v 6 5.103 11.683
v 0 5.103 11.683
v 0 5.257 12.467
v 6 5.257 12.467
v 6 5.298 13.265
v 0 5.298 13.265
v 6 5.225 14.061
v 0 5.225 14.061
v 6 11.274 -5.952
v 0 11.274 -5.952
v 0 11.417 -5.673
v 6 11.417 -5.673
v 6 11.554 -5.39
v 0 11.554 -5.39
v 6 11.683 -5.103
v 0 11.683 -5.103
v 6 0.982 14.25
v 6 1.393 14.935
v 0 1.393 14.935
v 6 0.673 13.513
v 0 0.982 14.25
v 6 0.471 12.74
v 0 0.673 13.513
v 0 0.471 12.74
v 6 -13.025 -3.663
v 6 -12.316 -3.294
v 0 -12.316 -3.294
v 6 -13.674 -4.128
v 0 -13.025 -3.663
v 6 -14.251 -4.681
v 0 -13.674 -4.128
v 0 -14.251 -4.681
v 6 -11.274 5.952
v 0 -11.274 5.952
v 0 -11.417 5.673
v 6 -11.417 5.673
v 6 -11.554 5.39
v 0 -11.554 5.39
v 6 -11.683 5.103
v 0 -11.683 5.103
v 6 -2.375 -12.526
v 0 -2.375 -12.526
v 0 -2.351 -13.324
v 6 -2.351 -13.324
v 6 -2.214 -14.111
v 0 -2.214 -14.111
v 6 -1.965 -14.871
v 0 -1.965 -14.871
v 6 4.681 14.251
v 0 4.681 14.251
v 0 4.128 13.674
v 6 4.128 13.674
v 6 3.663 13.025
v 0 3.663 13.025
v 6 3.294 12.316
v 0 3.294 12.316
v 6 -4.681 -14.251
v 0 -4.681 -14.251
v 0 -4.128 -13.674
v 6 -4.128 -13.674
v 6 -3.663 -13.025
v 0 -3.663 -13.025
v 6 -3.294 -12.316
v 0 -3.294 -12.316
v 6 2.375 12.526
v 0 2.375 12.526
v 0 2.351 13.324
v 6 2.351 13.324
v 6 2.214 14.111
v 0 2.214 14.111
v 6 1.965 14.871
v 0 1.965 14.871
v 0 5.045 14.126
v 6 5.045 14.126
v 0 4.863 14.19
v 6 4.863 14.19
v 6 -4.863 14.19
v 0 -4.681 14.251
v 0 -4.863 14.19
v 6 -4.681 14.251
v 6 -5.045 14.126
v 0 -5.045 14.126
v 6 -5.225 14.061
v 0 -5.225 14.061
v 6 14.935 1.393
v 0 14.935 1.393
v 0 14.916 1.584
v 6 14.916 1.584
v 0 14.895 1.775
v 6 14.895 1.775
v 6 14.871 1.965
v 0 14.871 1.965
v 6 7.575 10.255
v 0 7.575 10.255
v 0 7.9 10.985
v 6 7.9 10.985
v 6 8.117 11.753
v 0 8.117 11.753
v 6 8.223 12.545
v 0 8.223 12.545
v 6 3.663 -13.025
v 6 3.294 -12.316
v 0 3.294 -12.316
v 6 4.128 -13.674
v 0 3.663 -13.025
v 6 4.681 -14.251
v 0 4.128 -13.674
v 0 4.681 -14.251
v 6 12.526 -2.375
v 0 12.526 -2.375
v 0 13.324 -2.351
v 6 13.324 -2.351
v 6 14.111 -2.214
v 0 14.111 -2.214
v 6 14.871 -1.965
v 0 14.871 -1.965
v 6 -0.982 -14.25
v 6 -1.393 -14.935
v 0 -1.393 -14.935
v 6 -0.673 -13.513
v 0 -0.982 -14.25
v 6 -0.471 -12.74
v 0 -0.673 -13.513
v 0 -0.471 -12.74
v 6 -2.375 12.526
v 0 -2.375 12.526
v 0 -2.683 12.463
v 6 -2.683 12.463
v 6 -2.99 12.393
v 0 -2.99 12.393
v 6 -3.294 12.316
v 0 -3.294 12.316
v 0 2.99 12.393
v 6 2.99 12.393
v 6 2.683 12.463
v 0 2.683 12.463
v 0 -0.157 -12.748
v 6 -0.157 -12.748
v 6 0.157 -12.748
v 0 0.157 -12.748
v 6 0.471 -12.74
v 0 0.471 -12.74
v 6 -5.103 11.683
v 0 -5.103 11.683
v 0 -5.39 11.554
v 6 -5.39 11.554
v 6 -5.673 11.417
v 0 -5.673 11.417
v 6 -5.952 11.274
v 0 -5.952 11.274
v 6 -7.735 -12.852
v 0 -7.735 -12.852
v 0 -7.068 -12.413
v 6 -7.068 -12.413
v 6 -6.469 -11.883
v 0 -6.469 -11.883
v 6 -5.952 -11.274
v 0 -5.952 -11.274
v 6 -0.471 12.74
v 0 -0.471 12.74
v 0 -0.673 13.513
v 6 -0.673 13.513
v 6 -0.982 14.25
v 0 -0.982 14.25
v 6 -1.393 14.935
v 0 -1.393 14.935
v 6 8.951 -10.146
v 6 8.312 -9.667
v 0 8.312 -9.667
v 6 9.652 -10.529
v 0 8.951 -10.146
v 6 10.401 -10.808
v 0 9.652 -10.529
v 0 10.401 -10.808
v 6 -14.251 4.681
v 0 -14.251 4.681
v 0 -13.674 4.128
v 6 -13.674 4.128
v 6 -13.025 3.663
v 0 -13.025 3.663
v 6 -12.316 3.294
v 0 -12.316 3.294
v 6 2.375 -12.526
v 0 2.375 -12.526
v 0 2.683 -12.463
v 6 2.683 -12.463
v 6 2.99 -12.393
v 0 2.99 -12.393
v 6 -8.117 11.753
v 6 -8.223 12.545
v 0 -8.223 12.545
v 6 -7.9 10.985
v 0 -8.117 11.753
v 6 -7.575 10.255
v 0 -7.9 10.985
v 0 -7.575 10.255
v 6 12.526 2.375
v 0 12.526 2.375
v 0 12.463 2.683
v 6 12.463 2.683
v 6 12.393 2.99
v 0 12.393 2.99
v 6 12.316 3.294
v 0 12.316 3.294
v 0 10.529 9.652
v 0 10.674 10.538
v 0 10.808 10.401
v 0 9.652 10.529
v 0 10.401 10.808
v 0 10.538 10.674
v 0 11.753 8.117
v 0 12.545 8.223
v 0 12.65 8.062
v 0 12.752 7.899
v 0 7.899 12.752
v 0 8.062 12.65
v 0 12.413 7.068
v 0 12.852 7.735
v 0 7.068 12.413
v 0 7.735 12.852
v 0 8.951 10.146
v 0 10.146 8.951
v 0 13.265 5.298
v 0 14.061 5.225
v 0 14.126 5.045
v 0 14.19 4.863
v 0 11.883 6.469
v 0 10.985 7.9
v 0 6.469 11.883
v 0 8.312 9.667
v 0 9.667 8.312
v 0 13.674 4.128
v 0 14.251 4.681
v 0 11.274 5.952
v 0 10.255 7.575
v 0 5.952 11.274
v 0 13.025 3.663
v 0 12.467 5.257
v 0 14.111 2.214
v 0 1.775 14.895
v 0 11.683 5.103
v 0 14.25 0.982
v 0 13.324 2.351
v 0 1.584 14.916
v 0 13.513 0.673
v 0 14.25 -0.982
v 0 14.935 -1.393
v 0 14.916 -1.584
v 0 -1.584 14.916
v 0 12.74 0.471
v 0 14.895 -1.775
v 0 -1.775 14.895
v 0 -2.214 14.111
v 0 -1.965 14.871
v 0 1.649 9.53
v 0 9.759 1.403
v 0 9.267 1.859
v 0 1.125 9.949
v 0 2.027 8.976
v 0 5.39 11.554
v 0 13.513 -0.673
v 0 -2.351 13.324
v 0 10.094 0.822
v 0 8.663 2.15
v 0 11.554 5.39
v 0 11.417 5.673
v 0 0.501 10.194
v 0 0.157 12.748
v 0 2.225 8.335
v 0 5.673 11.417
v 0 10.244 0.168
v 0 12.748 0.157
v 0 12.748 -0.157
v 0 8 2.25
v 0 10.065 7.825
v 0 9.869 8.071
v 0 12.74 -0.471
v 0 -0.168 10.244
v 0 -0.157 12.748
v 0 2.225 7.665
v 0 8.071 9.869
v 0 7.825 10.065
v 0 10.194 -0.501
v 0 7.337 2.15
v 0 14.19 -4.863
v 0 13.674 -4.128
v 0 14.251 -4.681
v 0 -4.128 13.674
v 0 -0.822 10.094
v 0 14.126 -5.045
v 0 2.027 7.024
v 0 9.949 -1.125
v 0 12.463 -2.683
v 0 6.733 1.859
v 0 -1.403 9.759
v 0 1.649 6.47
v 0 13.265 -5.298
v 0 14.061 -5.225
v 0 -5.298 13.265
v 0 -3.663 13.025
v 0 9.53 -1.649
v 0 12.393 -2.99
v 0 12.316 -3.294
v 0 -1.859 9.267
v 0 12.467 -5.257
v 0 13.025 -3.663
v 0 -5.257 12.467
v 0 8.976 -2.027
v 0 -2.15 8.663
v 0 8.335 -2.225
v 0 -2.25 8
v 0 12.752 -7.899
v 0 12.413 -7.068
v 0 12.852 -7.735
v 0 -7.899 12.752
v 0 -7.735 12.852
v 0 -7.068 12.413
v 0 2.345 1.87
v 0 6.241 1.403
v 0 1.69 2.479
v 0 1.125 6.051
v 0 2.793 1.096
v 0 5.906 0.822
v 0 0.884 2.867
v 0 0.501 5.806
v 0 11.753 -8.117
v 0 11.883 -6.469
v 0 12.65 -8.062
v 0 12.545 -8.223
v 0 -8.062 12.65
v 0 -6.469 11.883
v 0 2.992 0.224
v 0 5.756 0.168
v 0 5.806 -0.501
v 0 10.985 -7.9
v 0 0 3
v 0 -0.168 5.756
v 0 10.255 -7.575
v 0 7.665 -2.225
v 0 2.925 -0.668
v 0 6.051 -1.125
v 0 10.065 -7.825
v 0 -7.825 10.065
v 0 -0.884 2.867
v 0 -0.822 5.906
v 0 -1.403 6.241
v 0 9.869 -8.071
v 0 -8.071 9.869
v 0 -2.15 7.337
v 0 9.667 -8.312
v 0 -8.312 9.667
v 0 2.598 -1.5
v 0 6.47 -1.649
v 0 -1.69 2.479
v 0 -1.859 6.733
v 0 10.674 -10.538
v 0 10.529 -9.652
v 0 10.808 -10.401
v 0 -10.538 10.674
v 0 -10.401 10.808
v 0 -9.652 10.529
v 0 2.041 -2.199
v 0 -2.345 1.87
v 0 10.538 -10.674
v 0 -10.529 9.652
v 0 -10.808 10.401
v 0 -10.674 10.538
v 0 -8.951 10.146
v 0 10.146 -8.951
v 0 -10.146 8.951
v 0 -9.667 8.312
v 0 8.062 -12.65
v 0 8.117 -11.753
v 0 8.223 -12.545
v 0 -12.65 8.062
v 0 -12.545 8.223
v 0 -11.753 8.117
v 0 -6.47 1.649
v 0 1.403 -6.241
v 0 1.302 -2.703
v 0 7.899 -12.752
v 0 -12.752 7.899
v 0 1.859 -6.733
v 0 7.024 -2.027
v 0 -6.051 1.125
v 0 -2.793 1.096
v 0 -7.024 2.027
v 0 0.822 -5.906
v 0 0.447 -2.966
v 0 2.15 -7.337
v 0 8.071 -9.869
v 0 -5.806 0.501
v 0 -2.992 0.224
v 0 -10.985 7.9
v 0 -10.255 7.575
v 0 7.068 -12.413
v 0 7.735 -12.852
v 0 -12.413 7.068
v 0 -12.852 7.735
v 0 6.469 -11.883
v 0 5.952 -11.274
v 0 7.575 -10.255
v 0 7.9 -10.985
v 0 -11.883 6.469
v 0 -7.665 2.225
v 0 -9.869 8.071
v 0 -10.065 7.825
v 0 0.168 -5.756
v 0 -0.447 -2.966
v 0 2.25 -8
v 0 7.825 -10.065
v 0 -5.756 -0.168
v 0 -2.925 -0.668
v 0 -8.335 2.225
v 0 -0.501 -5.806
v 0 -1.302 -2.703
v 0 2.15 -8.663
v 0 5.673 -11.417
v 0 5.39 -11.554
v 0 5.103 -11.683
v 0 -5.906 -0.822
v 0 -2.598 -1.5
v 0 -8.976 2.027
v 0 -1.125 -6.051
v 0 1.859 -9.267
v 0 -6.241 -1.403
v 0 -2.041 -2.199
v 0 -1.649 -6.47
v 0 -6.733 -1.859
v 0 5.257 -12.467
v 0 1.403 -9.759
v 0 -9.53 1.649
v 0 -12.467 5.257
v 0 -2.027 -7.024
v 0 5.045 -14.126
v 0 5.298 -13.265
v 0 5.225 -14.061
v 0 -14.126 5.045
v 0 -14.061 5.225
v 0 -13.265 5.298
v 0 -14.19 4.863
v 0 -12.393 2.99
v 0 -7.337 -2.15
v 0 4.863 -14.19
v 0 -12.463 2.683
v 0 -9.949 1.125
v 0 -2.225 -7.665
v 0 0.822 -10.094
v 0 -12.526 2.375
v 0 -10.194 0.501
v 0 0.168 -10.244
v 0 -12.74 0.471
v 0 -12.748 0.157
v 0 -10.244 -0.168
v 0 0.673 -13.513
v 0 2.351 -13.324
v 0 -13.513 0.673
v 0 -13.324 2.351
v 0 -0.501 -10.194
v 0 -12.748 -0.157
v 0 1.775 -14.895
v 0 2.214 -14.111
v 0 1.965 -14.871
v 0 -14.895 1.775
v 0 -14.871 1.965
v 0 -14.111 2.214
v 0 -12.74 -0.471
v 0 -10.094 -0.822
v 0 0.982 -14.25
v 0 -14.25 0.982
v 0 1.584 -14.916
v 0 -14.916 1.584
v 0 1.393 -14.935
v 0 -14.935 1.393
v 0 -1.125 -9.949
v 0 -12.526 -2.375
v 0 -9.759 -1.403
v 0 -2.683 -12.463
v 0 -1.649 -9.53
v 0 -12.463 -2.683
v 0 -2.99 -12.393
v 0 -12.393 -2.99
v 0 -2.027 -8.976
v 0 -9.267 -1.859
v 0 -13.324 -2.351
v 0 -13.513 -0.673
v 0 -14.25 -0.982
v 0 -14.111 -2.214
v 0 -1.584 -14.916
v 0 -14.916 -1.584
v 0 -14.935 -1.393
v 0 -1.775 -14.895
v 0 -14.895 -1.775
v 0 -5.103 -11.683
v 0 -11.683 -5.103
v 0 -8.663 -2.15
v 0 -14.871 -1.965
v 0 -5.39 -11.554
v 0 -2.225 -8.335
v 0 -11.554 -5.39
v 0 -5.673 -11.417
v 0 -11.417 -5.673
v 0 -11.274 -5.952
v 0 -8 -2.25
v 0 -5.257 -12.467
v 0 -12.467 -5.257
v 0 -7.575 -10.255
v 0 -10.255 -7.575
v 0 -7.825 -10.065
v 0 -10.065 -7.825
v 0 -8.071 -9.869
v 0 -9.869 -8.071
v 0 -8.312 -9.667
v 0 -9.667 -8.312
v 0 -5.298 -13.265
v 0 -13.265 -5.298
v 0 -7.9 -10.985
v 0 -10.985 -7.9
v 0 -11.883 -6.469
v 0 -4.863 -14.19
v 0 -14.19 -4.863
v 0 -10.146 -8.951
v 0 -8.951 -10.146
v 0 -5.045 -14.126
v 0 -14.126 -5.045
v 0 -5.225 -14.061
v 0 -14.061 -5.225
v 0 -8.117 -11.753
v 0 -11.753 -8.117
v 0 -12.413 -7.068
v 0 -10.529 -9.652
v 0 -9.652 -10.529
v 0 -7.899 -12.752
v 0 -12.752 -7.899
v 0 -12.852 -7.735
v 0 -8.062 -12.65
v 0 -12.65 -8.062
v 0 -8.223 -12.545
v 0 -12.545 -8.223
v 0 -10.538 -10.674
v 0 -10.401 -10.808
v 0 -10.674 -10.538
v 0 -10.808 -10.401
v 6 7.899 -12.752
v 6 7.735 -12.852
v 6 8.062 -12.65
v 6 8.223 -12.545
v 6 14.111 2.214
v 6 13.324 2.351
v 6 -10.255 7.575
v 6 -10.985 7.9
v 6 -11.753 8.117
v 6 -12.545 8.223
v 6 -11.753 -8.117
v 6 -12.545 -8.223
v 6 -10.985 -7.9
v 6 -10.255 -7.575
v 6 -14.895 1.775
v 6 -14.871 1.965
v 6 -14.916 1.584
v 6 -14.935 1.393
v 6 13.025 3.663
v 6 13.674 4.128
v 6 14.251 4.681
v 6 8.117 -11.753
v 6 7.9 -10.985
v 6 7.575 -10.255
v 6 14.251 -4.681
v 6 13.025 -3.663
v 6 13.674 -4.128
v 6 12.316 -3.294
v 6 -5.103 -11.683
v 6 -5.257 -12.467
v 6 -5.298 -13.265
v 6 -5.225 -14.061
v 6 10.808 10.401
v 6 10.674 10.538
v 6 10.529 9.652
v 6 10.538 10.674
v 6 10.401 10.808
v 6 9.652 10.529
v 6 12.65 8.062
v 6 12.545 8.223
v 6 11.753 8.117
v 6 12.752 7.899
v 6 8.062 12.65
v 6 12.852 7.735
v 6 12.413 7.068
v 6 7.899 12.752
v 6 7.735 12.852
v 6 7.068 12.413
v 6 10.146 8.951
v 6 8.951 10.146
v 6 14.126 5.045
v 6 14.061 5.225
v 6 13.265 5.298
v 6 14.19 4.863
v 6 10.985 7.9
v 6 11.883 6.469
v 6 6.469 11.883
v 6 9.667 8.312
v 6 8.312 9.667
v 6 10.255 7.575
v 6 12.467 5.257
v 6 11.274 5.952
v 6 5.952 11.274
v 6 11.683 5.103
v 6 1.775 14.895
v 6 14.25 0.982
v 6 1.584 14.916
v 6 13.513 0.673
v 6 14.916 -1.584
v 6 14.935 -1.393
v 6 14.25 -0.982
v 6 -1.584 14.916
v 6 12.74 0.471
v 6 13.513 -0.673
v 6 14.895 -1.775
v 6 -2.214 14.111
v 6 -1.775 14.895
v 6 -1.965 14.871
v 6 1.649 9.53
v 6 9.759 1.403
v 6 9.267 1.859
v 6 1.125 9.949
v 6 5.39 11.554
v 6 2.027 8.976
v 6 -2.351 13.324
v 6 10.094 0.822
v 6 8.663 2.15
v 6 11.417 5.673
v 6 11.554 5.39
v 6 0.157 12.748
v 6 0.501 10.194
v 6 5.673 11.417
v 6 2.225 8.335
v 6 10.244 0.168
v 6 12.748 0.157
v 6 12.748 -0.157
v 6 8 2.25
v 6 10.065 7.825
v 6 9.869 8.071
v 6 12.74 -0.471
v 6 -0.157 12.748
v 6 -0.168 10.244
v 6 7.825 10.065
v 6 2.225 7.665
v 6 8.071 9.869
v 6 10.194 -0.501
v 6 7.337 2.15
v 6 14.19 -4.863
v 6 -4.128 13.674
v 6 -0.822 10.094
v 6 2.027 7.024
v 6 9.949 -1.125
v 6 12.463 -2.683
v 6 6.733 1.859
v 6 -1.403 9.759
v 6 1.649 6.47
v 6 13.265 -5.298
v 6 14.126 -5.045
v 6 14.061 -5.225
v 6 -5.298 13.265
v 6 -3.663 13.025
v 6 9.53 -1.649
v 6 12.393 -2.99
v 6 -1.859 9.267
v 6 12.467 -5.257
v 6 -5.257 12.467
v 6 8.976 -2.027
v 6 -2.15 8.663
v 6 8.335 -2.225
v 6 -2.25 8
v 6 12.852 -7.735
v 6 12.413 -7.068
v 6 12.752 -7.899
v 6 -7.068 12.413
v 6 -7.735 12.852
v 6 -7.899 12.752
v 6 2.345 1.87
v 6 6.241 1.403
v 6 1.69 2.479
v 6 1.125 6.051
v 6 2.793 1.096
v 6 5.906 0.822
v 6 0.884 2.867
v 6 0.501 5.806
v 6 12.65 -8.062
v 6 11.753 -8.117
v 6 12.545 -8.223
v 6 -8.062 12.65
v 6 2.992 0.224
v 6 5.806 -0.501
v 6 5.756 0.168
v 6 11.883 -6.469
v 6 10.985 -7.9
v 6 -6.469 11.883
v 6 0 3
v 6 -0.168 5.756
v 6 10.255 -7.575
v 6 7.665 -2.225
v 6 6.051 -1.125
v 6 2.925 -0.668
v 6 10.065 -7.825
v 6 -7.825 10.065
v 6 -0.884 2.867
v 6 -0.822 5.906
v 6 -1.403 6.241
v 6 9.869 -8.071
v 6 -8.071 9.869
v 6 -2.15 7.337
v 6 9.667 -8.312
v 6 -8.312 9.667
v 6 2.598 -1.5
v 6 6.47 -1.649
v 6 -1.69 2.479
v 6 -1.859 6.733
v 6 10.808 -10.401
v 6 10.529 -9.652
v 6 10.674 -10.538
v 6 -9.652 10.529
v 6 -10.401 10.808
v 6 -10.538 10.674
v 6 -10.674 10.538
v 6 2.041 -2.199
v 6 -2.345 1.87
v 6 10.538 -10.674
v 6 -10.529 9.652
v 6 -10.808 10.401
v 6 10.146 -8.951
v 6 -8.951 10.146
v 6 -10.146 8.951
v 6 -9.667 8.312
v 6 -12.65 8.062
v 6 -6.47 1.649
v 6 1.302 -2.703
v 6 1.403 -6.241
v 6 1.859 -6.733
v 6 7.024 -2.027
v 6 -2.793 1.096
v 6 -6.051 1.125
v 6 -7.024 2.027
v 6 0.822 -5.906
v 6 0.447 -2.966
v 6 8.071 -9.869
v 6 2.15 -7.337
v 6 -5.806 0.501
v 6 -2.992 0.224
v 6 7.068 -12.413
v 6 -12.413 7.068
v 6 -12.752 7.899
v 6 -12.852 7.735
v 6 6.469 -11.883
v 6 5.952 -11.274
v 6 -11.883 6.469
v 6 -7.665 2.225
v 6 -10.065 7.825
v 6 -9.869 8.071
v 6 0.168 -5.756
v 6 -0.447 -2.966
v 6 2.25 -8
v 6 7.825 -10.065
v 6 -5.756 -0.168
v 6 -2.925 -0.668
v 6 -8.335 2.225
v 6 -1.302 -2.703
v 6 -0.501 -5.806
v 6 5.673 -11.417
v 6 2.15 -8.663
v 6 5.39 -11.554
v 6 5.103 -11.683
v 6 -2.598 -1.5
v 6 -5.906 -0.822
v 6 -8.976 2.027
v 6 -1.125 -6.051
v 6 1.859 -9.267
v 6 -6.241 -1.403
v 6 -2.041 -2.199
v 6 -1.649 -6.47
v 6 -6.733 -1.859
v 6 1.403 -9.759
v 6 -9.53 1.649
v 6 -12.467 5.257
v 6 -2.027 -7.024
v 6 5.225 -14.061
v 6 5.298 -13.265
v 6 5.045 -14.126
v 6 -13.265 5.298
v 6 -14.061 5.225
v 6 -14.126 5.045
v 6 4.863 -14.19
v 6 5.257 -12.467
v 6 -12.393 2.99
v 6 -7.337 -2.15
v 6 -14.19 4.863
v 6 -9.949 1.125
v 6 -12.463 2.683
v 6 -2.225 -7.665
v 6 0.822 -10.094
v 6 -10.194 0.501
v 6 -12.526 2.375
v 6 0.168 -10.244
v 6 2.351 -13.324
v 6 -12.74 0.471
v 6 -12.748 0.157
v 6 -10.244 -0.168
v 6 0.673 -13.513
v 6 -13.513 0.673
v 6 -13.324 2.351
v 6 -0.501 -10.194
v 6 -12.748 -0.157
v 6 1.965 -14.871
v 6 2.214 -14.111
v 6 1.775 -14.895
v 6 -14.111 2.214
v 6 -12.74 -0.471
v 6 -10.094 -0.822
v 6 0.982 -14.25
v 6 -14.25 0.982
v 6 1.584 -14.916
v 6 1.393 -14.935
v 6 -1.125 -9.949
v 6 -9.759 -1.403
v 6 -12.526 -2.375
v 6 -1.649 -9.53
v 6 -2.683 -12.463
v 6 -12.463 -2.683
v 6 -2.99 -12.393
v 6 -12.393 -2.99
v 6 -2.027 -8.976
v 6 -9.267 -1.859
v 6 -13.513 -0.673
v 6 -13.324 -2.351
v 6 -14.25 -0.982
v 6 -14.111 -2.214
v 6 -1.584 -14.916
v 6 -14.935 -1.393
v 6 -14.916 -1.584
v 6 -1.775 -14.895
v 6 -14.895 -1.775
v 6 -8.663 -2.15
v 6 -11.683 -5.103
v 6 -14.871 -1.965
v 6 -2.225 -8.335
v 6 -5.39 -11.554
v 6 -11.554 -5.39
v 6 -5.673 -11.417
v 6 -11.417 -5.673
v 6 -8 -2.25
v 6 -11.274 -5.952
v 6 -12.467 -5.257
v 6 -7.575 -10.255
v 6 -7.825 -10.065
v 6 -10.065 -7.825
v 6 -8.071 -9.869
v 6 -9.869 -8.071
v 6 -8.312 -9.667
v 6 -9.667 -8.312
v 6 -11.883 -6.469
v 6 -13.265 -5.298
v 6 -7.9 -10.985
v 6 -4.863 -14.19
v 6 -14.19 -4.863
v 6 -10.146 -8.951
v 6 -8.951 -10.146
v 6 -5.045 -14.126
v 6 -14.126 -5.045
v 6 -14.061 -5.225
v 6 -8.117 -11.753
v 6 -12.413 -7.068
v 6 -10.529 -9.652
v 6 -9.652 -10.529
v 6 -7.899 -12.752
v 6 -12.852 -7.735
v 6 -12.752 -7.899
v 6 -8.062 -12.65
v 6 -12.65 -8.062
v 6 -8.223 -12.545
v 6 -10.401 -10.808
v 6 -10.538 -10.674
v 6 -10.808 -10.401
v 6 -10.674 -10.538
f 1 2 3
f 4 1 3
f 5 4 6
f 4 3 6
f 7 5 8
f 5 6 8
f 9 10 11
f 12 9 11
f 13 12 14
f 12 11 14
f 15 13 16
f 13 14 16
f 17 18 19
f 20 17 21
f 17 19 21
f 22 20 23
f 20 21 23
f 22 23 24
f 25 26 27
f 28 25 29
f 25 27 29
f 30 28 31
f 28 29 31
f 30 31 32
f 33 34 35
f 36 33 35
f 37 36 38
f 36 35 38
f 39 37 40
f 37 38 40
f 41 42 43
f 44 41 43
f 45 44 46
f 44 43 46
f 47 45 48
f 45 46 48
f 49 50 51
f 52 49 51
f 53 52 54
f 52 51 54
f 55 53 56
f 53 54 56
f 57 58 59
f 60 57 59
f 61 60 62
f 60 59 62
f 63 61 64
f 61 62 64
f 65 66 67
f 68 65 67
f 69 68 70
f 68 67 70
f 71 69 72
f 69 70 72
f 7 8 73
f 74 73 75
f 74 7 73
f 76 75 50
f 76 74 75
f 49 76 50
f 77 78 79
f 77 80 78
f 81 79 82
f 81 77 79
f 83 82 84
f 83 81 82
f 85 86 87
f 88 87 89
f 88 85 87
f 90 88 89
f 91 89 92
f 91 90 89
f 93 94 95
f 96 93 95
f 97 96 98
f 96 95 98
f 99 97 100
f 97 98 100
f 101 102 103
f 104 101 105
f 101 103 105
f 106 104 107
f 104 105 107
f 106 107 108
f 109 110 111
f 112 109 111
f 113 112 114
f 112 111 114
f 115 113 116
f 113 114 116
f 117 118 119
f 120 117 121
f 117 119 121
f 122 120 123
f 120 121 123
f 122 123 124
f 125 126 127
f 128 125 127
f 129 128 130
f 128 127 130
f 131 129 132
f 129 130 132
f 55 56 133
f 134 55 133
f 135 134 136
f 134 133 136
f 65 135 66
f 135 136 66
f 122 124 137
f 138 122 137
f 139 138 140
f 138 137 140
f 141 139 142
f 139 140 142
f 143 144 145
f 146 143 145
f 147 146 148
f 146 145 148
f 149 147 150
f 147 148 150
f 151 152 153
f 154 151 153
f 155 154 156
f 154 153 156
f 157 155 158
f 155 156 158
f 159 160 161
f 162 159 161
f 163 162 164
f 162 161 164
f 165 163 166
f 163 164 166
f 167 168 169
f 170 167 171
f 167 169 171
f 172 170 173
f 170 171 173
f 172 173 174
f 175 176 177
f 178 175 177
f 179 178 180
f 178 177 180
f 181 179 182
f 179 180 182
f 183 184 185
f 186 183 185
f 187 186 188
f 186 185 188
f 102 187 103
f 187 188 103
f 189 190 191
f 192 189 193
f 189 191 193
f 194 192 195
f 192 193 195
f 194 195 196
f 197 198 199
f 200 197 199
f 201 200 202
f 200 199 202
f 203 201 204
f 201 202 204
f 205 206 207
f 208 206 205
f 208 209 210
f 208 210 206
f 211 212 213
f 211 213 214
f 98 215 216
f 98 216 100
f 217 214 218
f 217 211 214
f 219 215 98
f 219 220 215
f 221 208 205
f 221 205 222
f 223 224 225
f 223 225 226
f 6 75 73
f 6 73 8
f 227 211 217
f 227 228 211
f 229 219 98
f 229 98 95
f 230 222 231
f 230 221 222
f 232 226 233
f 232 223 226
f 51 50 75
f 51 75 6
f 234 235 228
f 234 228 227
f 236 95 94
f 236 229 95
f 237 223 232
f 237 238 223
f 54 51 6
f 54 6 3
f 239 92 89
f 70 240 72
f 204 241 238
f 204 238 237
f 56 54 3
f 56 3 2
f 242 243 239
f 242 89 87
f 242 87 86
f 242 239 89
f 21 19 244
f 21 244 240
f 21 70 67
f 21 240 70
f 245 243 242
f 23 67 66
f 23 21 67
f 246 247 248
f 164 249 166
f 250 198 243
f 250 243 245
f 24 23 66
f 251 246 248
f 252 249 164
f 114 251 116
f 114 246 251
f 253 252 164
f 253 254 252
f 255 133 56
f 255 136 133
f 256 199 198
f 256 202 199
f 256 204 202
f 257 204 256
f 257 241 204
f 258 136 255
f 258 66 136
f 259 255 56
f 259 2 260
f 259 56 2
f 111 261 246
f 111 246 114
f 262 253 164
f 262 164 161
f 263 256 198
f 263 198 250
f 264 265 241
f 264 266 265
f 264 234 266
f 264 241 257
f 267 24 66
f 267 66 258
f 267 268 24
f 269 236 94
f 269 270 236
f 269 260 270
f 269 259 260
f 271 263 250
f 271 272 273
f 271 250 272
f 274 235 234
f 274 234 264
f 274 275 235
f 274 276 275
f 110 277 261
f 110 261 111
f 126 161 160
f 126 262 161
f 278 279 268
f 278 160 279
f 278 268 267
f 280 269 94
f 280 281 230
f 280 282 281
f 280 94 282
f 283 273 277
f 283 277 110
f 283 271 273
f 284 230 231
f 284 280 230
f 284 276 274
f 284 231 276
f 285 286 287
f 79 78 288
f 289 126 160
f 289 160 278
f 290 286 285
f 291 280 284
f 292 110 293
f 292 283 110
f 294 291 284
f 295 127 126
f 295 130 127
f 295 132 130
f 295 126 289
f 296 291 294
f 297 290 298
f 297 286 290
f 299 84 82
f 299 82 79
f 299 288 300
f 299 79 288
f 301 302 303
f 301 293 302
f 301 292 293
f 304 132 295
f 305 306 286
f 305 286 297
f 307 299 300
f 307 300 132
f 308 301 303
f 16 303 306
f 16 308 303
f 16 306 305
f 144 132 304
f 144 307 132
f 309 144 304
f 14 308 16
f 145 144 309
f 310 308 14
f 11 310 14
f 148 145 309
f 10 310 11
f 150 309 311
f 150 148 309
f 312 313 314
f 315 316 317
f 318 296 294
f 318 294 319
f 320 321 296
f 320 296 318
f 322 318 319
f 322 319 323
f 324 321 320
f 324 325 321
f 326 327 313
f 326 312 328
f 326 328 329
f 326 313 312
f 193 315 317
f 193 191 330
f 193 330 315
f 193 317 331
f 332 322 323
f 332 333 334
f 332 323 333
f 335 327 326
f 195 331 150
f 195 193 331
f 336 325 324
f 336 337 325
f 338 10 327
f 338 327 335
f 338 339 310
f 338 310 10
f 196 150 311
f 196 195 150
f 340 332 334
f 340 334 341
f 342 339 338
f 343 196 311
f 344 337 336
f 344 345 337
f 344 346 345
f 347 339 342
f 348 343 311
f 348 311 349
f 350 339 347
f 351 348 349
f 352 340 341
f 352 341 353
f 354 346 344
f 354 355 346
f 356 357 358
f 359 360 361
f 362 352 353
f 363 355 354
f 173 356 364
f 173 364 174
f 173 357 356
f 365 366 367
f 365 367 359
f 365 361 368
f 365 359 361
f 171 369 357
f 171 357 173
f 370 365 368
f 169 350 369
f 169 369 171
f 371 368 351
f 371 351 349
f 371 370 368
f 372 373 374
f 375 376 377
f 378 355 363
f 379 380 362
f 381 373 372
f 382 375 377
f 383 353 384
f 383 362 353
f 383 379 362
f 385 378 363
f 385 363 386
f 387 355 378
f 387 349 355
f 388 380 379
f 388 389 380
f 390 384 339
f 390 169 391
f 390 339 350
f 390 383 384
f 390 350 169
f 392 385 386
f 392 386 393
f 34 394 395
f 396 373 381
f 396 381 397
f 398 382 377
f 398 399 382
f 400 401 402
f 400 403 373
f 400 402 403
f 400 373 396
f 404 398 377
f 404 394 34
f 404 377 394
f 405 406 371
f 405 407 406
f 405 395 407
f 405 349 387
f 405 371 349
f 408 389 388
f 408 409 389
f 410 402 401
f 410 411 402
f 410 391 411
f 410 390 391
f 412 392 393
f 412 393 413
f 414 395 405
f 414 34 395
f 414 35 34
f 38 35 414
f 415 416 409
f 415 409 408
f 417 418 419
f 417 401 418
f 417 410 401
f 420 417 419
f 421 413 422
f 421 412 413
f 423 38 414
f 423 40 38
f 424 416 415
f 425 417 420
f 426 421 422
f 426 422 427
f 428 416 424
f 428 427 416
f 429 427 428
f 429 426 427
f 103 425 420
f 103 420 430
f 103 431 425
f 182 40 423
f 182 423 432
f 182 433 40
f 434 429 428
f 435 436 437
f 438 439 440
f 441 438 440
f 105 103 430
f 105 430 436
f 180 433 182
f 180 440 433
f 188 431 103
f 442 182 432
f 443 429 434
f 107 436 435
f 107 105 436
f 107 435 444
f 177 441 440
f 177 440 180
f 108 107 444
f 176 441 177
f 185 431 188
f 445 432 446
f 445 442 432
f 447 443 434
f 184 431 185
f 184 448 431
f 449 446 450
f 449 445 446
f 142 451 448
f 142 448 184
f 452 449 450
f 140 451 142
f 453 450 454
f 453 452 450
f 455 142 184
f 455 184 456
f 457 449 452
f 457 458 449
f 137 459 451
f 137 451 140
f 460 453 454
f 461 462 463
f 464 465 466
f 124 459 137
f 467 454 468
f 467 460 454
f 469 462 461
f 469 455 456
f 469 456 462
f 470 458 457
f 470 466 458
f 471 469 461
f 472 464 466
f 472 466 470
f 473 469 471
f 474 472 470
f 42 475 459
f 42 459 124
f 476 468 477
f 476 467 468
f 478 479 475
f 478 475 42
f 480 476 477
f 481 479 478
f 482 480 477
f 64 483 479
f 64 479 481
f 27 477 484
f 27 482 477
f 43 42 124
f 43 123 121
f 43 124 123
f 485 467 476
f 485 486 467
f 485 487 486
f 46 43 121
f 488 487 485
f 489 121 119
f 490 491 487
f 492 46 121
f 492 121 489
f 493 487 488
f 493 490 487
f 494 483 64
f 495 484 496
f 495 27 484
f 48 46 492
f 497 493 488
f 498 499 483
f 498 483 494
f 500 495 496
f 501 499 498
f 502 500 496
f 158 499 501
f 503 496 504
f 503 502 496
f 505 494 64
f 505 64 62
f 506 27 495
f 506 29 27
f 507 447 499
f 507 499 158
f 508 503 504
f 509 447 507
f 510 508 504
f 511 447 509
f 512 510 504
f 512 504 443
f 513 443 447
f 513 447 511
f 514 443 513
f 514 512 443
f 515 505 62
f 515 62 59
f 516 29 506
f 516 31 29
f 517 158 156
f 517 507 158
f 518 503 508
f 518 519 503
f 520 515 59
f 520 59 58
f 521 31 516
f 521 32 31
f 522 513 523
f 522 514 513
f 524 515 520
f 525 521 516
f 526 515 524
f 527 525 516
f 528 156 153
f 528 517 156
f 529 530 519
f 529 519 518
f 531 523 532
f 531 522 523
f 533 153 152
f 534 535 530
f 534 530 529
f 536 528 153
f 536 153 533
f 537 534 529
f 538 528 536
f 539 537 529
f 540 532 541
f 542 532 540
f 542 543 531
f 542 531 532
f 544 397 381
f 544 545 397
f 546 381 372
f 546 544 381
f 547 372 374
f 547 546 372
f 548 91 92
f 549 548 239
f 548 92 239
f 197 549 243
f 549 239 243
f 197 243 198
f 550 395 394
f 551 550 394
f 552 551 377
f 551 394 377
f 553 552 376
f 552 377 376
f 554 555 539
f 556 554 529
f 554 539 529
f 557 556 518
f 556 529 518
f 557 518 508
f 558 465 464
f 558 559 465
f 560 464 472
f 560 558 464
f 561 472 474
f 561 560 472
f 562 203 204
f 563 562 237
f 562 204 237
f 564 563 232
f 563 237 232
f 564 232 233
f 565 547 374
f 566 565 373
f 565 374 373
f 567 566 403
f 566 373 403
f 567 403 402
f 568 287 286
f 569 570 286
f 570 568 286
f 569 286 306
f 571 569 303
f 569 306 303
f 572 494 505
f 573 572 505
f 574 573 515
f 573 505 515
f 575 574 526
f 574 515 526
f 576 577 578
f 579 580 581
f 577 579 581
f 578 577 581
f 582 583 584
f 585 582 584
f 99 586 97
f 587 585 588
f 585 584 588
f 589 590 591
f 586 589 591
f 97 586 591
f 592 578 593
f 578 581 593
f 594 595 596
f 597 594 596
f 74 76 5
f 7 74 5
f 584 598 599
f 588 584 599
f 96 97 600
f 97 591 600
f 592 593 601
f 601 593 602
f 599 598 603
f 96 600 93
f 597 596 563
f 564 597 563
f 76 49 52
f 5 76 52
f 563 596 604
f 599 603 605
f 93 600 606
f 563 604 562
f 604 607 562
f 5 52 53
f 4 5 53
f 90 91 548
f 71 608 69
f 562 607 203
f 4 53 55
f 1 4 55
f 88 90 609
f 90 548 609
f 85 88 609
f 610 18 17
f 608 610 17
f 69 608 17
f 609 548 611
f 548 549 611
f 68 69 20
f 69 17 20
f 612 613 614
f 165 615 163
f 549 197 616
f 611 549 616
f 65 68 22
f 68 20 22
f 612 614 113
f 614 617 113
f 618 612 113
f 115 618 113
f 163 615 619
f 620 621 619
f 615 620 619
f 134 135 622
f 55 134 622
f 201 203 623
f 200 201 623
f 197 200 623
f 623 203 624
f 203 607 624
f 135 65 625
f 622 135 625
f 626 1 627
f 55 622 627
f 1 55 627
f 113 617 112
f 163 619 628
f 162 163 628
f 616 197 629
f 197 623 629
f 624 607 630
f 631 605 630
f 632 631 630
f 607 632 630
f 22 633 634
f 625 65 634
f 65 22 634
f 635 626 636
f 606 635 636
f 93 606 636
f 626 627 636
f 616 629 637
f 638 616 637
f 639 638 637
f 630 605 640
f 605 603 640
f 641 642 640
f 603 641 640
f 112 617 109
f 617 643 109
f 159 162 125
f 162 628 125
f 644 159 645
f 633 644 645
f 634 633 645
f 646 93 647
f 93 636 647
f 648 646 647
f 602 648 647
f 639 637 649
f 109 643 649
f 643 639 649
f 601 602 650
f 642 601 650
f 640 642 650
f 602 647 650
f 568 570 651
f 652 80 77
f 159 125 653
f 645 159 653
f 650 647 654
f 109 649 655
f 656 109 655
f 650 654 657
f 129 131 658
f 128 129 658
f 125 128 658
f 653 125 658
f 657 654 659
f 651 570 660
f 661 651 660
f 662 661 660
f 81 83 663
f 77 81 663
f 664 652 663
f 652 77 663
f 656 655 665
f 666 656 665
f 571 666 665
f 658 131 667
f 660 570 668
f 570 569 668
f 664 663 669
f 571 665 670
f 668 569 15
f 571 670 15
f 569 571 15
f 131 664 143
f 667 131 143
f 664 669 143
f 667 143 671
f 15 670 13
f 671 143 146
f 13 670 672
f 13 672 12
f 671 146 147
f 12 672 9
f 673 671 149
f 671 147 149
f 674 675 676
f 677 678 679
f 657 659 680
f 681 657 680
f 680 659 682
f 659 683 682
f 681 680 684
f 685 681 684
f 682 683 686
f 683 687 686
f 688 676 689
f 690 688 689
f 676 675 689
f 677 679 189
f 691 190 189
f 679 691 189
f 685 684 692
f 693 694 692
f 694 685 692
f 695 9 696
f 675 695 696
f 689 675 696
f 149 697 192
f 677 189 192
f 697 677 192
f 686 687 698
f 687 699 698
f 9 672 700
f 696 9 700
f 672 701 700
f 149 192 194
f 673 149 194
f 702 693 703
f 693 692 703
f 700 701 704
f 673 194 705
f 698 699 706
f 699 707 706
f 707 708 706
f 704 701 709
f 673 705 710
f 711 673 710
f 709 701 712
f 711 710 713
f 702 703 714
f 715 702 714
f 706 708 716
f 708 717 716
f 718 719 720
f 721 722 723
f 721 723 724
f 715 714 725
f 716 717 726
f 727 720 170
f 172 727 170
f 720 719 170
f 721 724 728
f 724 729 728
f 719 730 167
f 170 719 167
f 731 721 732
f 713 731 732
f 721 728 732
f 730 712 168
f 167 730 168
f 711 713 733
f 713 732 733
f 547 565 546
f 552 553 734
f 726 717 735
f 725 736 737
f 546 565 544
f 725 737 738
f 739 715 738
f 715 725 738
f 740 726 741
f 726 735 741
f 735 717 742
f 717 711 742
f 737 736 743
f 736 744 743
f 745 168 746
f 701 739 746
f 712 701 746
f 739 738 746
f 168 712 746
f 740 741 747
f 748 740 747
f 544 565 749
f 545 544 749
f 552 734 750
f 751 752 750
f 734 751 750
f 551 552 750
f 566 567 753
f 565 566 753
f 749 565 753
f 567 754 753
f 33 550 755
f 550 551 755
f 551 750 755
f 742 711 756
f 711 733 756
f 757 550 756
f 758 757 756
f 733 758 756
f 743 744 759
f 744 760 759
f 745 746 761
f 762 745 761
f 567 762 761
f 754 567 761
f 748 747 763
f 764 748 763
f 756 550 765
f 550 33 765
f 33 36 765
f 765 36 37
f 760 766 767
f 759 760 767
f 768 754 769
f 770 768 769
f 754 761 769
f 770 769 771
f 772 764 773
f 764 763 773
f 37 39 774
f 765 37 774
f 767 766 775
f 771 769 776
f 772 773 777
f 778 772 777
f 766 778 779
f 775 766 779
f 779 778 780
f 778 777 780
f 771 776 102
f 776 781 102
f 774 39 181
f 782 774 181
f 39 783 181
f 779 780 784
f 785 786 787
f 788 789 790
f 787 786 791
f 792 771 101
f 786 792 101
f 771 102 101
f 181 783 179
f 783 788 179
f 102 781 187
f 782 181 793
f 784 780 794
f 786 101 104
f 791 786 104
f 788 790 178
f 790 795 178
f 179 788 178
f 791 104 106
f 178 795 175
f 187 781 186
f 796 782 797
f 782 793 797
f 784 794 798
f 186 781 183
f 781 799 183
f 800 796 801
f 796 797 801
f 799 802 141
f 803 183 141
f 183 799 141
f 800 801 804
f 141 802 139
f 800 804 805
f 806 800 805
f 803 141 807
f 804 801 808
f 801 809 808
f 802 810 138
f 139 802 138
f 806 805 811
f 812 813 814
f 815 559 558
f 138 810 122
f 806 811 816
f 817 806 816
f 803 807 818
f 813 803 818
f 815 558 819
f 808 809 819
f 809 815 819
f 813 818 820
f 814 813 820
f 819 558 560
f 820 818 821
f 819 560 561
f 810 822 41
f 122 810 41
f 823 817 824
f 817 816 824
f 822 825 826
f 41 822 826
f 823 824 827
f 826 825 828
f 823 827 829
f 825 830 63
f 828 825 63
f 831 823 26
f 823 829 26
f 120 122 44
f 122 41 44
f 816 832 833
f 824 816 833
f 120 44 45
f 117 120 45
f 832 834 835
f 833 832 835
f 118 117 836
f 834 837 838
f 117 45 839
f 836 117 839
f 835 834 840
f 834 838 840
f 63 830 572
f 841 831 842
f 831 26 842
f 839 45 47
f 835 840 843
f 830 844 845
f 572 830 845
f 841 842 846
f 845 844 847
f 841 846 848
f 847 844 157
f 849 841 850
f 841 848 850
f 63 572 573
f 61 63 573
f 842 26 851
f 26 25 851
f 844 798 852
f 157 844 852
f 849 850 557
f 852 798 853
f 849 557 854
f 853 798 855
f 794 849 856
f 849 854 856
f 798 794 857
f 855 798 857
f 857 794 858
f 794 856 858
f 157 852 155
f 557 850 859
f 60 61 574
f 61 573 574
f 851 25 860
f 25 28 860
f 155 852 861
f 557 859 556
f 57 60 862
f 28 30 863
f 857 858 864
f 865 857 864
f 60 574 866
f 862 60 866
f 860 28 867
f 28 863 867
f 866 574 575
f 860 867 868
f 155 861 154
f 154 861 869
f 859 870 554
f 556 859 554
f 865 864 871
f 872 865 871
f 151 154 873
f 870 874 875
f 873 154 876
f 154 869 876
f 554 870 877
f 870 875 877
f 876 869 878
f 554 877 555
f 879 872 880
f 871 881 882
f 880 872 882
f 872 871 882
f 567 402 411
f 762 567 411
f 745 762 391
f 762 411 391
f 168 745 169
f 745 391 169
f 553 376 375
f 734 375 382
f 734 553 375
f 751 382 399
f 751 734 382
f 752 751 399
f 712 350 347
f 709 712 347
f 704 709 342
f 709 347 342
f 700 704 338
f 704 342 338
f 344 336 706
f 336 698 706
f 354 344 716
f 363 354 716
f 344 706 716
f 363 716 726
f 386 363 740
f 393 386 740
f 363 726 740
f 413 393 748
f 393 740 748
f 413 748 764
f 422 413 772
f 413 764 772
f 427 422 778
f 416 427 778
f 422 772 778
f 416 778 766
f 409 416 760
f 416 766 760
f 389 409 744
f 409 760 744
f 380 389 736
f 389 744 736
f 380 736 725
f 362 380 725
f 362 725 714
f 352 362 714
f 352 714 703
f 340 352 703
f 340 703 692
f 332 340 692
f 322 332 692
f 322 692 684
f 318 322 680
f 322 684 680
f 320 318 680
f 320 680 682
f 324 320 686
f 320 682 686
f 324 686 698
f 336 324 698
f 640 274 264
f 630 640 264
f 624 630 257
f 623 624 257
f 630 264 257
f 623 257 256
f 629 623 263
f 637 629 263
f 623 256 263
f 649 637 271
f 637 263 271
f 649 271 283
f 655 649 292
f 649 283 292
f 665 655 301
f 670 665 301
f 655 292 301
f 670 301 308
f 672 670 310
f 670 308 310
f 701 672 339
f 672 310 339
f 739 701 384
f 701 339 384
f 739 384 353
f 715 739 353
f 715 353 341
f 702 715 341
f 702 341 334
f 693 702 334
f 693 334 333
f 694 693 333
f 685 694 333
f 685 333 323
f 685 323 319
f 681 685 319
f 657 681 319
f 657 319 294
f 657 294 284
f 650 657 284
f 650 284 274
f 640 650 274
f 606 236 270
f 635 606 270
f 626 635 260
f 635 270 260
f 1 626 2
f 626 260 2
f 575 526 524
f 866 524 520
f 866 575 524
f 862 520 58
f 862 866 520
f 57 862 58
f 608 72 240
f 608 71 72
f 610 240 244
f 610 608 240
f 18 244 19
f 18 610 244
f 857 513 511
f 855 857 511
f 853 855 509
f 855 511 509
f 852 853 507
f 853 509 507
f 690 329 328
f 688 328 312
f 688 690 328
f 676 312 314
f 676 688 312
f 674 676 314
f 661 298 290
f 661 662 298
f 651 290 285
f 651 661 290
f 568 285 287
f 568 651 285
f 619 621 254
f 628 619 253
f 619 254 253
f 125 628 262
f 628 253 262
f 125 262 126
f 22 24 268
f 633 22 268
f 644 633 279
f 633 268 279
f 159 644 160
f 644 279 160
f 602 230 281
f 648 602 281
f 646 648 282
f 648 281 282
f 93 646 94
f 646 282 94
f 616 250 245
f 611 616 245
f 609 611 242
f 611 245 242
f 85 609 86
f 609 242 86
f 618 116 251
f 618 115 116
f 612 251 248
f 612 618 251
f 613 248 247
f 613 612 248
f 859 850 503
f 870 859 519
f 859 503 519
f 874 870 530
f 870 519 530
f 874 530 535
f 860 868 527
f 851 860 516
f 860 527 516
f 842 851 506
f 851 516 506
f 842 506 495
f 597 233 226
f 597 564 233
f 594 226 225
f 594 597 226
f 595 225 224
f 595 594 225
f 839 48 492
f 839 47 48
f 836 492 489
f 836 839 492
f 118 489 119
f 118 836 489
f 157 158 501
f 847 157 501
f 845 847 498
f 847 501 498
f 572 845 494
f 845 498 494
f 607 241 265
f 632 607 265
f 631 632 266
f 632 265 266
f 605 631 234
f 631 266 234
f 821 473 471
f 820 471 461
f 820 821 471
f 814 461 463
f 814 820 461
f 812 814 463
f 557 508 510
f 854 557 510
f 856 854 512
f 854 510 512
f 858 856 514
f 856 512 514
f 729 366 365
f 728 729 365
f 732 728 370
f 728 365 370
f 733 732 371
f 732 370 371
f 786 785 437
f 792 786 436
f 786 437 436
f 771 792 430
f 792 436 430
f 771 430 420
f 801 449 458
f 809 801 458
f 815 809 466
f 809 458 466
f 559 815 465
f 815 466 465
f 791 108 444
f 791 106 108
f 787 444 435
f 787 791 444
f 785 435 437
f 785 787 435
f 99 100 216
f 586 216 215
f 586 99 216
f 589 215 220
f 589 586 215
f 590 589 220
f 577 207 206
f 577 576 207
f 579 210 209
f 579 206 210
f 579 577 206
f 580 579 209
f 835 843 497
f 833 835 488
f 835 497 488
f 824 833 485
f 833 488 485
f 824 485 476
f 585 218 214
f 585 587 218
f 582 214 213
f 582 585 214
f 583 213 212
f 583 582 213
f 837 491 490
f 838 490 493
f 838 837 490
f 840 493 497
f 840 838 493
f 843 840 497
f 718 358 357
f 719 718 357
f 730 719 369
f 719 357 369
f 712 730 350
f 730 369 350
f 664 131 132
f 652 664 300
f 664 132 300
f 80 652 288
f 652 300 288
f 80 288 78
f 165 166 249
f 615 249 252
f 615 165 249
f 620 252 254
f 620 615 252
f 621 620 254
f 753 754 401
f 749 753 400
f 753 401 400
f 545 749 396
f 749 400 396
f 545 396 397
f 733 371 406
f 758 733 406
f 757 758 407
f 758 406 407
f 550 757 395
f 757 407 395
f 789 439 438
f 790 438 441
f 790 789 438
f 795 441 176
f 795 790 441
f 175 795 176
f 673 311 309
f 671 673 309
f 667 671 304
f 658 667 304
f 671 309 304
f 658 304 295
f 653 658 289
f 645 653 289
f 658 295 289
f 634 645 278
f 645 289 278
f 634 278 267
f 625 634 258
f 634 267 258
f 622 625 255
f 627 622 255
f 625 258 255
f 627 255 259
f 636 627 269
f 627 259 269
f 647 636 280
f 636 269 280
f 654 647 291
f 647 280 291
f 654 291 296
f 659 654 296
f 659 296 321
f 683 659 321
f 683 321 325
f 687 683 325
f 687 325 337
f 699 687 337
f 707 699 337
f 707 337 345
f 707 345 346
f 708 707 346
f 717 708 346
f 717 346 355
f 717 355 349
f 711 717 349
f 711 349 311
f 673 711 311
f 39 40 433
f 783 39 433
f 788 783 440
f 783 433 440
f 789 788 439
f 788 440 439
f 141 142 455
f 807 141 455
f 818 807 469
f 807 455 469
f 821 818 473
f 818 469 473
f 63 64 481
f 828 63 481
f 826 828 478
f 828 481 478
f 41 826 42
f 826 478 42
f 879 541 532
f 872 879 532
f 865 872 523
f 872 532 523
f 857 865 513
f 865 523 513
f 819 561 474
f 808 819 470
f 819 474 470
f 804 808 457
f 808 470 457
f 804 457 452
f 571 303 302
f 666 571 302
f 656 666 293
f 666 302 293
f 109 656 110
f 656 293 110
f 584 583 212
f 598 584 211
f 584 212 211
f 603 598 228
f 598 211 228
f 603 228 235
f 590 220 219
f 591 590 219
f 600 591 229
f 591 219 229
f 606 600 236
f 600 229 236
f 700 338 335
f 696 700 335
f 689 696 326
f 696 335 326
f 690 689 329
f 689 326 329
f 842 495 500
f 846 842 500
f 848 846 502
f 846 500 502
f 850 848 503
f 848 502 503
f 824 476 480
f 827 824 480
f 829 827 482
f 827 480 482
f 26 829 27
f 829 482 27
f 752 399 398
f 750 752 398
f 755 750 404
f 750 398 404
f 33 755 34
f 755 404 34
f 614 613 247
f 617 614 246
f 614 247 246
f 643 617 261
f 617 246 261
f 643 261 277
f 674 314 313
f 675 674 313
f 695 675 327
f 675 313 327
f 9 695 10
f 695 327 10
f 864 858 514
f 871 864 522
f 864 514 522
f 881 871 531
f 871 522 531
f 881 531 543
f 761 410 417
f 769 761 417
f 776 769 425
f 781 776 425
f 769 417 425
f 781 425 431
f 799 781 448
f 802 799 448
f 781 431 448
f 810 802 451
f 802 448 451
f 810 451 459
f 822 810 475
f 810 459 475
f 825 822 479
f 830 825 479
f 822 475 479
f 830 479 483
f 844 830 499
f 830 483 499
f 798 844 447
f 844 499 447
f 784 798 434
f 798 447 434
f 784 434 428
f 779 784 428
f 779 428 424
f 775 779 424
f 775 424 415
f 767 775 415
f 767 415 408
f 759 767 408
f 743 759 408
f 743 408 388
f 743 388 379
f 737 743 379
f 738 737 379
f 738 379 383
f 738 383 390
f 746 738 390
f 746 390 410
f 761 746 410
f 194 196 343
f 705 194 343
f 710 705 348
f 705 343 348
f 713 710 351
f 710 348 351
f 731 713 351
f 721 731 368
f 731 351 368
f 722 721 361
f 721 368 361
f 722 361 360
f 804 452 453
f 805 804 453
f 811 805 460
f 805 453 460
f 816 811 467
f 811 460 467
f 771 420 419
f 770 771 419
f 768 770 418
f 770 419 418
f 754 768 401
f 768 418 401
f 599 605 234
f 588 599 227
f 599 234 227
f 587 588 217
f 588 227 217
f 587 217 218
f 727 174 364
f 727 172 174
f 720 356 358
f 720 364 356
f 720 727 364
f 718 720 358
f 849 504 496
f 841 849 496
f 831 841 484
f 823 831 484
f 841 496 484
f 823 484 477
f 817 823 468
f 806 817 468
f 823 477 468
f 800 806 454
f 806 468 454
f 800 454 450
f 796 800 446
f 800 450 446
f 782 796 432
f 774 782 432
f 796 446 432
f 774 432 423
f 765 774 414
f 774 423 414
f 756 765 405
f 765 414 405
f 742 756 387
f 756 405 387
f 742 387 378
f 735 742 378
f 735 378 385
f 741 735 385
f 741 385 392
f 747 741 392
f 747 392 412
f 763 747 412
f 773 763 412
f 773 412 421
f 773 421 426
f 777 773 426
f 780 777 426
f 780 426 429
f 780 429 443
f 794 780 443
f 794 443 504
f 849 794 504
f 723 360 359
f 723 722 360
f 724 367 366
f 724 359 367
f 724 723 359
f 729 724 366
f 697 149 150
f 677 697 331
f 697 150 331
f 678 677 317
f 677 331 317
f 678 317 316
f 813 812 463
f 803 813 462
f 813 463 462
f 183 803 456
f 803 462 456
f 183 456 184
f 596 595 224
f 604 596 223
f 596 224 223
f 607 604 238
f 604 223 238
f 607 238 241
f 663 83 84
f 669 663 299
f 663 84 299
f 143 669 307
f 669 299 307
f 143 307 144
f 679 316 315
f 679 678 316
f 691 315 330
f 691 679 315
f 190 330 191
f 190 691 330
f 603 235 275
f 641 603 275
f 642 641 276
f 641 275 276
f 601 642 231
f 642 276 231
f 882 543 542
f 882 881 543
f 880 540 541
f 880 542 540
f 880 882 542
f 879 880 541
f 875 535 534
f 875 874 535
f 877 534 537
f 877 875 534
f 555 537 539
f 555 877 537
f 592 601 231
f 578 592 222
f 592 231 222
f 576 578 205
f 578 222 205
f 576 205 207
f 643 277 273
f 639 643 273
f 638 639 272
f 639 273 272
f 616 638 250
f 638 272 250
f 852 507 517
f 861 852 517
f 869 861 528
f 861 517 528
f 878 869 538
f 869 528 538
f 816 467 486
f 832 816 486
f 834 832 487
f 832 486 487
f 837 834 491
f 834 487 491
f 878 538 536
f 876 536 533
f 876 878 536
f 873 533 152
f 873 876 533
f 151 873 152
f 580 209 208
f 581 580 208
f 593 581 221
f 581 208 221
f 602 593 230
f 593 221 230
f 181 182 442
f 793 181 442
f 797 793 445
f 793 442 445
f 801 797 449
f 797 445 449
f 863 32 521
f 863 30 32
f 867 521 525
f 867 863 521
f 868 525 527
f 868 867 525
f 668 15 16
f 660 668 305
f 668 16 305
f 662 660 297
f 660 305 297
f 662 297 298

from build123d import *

# Parameters (mm, degrees)
BASPROSKE_W          = 6
BASPROSKE_H          = 15
TOOTHCUT_DEPTH       = 23.045407685
TEETHCUTS_COUNT      = 28
TEETHCUTS_ANGLE      = 347.142857143
BORSKE_R             = 3
BORE_DEPTH           = 50.0000508
M4_CLEARANCE_HOLE1_D = 4.5
CIRPATTERN1_COUNT    = 4


with BuildPart() as part:
    # BasProSke → Base-Revolve (revolve)
    with BuildSketch(Plane(origin=(0, 0, 0), x_dir=(1, 0, 0), z_dir=(0, 1, 0)), mode=Mode.PRIVATE) as base_revolve_sk:
        with Locations((3, 7.5)):
            Rectangle(BASPROSKE_W, BASPROSKE_H)
    revolve(base_revolve_sk.sketch.rotate(Axis((-10, 0, 0), (1, 0, 0)), 180), axis=Axis((-10, 0, 0), (1, 0, 0)))

    # TooCutSke → ToothCut (cut, through all)
    with BuildSketch(Plane(origin=(0, 0, 0), x_dir=(0, 0, -1), z_dir=(1, 0, 0))):
        with BuildLine():
            ThreePointArc((0.471336039, 12.740284272), (0, 12.749), (-0.471336039, 12.740284272))
            ThreePointArc((-0.471336039, 12.740284272), (-0.81983923, 13.900763331), (-1.409805137, 14.959114099))
            ThreePointArc((-1.409805137, 14.959114099), (0, 15.0254), (1.409805137, 14.959114099))
            ThreePointArc((1.409805137, 14.959114099), (0.81983923, 13.900763331), (0.471336039, 12.740284272))
        make_face()
    toothcut = extrude(amount=TOOTHCUT_DEPTH, mode=Mode.SUBTRACT)

    # TeethCuts: ToothCut ×28 about axis
    teethcuts_axis = Axis((-10, 0, 0), (1, 0, 0))
    for i in range(1, TEETHCUTS_COUNT):
        add(toothcut.rotate(teethcuts_axis, i * TEETHCUTS_ANGLE / (TEETHCUTS_COUNT - 1)), mode=Mode.SUBTRACT)

    # BorSke → Bore (cut, symmetric)
    with BuildSketch(Plane(origin=(0, 0, 0), x_dir=(0, 0, -1), z_dir=(1, 0, 0))):
        with Locations(Location((0, 0, 0), (0, 0, 180))):
            Circle(BORSKE_R)
    extrude(amount=BORE_DEPTH, both=True, mode=Mode.SUBTRACT)

    # M4 Clearance Hole1 (through all)
    with Locations(Plane(origin=(6, 0, 0), x_dir=(0, 0, -1), z_dir=(1, 0, 0))):
        with Locations((0, 8)):
            m4_clearance_hole1 = Hole(M4_CLEARANCE_HOLE1_D / 2)

    # CirPattern1: M4 Clearance Hole1 ×4 about axis
    cirpattern1_axis = Axis((0, 0, 0), (1, 0, 0))
    for i in range(1, CIRPATTERN1_COUNT):
        add(m4_clearance_hole1.rotate(cirpattern1_axis, i * 360 / CIRPATTERN1_COUNT), mode=Mode.SUBTRACT)


solid = part.part
